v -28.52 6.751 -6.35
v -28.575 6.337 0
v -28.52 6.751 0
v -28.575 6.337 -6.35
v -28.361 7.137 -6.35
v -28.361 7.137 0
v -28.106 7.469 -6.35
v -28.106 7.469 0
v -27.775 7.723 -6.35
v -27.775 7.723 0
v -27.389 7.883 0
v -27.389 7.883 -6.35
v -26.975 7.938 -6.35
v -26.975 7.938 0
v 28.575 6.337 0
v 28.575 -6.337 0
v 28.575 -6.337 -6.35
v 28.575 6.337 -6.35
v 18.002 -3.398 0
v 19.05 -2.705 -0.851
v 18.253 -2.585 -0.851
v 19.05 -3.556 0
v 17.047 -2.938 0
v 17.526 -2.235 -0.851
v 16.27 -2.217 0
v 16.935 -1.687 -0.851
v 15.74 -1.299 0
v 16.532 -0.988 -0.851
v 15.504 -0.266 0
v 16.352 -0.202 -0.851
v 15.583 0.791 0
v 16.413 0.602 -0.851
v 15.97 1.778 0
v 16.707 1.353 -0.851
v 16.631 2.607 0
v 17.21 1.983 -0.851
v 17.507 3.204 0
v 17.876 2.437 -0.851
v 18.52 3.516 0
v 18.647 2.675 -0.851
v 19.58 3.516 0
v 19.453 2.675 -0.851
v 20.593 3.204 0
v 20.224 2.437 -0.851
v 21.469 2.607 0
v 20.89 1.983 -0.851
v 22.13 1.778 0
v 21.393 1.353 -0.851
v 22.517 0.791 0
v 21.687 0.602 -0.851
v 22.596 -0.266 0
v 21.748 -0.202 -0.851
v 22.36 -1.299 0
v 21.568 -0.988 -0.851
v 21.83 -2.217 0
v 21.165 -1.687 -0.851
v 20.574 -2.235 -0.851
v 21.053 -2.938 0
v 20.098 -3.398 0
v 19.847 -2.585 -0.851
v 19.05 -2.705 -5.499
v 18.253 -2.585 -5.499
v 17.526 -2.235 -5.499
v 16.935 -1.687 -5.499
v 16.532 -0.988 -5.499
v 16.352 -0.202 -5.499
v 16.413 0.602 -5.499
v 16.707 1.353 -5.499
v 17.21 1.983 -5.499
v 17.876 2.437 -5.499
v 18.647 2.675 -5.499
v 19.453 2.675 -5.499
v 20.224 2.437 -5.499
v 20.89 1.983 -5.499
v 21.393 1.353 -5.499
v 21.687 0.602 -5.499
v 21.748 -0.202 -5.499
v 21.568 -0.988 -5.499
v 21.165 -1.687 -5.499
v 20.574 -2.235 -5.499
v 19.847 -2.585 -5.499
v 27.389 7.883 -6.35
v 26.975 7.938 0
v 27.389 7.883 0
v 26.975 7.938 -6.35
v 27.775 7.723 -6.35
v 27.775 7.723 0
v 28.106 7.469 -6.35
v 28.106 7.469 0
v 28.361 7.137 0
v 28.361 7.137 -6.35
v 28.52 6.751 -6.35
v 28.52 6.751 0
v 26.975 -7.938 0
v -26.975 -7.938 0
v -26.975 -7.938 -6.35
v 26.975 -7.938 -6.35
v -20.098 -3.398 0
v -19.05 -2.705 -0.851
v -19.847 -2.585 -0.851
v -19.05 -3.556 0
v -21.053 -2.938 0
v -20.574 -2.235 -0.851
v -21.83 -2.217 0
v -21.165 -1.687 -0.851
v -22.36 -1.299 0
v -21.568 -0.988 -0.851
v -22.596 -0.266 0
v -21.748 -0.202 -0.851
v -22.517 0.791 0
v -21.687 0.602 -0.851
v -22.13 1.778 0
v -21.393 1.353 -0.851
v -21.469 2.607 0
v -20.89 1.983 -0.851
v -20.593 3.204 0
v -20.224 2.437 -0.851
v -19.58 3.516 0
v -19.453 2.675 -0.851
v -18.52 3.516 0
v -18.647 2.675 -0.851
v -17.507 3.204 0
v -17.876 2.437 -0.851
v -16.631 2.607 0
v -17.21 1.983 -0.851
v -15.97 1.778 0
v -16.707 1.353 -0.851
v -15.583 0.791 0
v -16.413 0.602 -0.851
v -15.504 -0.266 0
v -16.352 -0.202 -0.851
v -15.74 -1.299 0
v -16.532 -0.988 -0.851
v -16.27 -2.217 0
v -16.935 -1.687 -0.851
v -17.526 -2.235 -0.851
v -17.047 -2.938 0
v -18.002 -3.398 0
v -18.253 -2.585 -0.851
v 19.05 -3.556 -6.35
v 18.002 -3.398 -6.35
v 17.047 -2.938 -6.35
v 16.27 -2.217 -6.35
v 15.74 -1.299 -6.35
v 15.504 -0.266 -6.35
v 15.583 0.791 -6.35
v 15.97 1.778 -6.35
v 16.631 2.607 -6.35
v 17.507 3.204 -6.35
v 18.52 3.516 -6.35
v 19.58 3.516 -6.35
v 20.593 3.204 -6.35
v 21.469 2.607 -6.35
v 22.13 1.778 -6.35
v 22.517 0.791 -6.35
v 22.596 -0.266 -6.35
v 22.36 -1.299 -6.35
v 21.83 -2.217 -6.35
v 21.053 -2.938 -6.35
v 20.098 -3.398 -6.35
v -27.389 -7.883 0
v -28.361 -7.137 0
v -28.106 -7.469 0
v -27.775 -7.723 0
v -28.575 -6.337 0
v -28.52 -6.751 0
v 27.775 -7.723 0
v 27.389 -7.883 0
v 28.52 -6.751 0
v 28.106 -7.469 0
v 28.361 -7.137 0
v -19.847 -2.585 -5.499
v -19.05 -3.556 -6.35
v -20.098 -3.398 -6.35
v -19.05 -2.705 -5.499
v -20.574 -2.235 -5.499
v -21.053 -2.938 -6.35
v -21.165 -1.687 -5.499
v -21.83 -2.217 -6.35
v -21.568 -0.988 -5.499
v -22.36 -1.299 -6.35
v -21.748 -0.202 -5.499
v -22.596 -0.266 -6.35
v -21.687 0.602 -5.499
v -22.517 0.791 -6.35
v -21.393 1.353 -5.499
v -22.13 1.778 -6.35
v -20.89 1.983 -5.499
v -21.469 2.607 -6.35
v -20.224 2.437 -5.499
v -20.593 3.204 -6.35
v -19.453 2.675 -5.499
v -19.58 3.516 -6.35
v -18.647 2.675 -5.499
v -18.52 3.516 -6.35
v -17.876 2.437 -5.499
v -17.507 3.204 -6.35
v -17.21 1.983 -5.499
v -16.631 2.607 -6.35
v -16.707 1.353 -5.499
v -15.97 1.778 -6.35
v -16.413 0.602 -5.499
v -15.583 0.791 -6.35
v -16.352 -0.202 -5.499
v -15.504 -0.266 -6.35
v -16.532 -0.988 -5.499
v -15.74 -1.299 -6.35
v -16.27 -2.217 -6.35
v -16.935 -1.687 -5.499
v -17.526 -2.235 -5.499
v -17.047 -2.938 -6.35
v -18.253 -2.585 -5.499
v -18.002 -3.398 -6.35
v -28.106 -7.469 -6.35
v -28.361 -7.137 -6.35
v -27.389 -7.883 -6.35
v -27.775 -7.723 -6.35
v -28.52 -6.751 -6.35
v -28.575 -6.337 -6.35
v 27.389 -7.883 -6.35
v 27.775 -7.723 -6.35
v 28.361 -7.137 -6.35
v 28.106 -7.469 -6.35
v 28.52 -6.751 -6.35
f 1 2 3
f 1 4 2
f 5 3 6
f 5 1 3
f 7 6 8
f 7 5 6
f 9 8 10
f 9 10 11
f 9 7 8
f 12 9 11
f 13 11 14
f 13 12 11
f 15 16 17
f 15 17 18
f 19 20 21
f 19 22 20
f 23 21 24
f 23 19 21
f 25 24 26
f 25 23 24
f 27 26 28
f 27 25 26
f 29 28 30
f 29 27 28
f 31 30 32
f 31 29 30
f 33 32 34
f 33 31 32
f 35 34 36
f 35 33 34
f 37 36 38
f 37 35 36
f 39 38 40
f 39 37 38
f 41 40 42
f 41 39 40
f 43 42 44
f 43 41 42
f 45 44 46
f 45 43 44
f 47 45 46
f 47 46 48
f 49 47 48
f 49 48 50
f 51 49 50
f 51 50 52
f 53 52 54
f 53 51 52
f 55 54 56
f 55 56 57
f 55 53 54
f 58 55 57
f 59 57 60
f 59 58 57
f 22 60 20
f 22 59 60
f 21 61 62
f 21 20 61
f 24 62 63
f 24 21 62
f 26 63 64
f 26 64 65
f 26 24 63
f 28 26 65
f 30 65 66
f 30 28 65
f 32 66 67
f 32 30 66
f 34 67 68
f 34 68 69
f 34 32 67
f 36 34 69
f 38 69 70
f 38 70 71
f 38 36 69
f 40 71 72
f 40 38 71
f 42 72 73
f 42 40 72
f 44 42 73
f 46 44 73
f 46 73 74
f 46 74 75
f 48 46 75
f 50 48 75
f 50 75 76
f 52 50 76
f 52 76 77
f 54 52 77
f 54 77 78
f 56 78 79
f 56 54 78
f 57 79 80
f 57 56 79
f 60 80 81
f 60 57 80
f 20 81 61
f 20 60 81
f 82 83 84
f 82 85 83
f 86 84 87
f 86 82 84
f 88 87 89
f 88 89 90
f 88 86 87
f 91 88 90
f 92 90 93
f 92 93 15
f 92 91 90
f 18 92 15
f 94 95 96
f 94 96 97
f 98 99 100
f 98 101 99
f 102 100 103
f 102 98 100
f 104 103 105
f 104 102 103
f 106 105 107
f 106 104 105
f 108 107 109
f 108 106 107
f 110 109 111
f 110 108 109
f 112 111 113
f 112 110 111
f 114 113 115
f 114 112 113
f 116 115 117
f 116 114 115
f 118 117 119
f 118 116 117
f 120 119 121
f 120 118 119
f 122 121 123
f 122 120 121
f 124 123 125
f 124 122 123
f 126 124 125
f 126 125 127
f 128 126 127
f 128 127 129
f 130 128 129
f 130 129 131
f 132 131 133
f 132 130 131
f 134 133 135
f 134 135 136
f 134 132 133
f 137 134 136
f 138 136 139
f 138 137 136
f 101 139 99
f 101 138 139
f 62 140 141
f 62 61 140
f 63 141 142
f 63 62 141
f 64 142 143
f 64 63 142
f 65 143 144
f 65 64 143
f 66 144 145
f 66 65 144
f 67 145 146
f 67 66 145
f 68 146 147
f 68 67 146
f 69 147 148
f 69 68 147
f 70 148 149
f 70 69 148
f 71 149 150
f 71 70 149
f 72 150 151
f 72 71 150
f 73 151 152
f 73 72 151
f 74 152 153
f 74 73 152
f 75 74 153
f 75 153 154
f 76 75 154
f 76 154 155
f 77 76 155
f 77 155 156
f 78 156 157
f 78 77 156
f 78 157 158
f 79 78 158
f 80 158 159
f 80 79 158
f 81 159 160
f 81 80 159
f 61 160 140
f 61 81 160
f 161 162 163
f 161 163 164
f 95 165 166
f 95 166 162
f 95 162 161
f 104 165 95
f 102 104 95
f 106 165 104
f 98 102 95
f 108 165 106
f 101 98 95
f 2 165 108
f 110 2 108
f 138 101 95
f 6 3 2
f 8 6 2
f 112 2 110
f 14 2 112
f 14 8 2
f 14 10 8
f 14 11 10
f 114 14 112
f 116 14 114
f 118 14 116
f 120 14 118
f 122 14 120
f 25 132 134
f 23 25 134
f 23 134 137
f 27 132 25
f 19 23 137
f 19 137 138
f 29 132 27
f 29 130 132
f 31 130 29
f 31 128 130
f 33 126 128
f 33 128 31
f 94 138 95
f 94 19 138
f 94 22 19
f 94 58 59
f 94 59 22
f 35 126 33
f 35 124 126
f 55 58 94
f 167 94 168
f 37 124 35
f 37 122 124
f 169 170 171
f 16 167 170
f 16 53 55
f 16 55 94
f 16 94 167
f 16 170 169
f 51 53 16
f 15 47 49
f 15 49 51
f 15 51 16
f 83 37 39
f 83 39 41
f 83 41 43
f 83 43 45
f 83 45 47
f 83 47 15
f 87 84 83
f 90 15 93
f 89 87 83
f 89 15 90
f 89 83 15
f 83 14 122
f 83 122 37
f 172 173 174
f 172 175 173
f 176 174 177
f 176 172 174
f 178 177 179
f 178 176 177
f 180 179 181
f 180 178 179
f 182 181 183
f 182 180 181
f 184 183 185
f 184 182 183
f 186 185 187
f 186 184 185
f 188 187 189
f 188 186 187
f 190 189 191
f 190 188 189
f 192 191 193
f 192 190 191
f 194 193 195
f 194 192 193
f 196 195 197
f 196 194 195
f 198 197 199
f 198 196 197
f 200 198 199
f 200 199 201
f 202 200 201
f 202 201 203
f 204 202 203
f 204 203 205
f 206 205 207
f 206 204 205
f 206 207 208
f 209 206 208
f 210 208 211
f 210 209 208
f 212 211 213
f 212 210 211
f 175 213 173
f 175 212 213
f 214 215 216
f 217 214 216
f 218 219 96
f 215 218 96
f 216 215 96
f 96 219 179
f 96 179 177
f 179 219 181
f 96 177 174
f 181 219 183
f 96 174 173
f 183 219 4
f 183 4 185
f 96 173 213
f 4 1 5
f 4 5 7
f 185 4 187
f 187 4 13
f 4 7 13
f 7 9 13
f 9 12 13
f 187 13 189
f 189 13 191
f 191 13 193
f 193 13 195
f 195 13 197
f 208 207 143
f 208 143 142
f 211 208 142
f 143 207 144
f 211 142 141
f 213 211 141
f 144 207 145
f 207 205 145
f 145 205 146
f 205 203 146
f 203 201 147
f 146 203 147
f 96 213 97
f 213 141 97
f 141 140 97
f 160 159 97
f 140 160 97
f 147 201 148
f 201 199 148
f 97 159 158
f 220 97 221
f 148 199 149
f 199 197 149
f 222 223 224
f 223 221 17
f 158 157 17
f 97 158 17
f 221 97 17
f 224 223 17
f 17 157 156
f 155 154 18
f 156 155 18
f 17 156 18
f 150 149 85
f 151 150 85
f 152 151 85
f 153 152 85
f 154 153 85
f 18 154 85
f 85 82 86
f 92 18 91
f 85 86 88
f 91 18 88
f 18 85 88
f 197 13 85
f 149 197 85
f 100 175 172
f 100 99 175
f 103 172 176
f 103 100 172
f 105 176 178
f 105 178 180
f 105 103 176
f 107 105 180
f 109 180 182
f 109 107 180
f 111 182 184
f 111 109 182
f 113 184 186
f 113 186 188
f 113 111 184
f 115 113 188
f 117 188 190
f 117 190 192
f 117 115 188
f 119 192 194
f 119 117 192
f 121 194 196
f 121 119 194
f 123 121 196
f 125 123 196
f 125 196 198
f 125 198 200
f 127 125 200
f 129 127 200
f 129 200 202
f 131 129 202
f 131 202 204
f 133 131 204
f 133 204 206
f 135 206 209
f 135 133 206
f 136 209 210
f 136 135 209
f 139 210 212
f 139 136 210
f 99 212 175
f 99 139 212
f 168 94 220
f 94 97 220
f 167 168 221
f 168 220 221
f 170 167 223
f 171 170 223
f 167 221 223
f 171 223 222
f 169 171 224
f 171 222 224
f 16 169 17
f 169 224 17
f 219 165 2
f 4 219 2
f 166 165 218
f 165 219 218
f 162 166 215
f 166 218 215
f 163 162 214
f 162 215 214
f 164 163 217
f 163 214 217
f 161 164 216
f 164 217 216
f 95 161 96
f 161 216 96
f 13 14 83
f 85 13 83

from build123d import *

# Parameters (mm, degrees)
SKETCH1_W                        = 57.15
SKETCH1_H                        = 15.875
BOSS_EXTRUDE1_DEPTH              = 6.35
F_1_4_28_TAPPED_HOLE1_AT_2_COUNT = 2
F_1_4_28_TAPPED_HOLE1_AT_2_PITCH = 38.1
FILLET1_R                        = 1.6002


with BuildPart() as part:
    # Sketch1 → Boss-Extrude1 (new body)
    with BuildSketch(Plane.XY):
        Rectangle(SKETCH1_W, SKETCH1_H)
    extrude(amount=-BOSS_EXTRUDE1_DEPTH)

    # Sketch2 → 1/4-28 Tapped Hole1 (revolve, cut)
    with BuildSketch(Plane(origin=(19.05, 0, 0), x_dir=(0, -1, 0), z_dir=(1, 0, 0))):
        Polygon((0, 0), (0, 6.35), (3.556, 6.35), (2.7051, 5.4991), (2.7051, 0.8509), (3.556, 0), align=None)
    f_1_4_28_tapped_hole1 = revolve(axis=Axis((19.05, 0, 6.35), (0, 0, -1)), mode=Mode.SUBTRACT)

    # 1/4-28 Tapped Hole1 at 2: 1/4-28 Tapped Hole1 ×2
    with Locations(*[(-i * F_1_4_28_TAPPED_HOLE1_AT_2_PITCH, 0, 0) for i in range(1, F_1_4_28_TAPPED_HOLE1_AT_2_COUNT)]):
        add(f_1_4_28_tapped_hole1, mode=Mode.SUBTRACT)

    # Fillet1
    fillet1_edges = [part.edges().sort_by_distance(p)[0] for p in [
        (-28.575, 7.9375, -3.175),
        (28.575, 7.9375, -3.175),
        (28.575, -7.9375, -3.175),
        (-28.575, -7.9375, -3.175),
    ]]
    fillet(fillet1_edges, radius=FILLET1_R)


solid = part.part
